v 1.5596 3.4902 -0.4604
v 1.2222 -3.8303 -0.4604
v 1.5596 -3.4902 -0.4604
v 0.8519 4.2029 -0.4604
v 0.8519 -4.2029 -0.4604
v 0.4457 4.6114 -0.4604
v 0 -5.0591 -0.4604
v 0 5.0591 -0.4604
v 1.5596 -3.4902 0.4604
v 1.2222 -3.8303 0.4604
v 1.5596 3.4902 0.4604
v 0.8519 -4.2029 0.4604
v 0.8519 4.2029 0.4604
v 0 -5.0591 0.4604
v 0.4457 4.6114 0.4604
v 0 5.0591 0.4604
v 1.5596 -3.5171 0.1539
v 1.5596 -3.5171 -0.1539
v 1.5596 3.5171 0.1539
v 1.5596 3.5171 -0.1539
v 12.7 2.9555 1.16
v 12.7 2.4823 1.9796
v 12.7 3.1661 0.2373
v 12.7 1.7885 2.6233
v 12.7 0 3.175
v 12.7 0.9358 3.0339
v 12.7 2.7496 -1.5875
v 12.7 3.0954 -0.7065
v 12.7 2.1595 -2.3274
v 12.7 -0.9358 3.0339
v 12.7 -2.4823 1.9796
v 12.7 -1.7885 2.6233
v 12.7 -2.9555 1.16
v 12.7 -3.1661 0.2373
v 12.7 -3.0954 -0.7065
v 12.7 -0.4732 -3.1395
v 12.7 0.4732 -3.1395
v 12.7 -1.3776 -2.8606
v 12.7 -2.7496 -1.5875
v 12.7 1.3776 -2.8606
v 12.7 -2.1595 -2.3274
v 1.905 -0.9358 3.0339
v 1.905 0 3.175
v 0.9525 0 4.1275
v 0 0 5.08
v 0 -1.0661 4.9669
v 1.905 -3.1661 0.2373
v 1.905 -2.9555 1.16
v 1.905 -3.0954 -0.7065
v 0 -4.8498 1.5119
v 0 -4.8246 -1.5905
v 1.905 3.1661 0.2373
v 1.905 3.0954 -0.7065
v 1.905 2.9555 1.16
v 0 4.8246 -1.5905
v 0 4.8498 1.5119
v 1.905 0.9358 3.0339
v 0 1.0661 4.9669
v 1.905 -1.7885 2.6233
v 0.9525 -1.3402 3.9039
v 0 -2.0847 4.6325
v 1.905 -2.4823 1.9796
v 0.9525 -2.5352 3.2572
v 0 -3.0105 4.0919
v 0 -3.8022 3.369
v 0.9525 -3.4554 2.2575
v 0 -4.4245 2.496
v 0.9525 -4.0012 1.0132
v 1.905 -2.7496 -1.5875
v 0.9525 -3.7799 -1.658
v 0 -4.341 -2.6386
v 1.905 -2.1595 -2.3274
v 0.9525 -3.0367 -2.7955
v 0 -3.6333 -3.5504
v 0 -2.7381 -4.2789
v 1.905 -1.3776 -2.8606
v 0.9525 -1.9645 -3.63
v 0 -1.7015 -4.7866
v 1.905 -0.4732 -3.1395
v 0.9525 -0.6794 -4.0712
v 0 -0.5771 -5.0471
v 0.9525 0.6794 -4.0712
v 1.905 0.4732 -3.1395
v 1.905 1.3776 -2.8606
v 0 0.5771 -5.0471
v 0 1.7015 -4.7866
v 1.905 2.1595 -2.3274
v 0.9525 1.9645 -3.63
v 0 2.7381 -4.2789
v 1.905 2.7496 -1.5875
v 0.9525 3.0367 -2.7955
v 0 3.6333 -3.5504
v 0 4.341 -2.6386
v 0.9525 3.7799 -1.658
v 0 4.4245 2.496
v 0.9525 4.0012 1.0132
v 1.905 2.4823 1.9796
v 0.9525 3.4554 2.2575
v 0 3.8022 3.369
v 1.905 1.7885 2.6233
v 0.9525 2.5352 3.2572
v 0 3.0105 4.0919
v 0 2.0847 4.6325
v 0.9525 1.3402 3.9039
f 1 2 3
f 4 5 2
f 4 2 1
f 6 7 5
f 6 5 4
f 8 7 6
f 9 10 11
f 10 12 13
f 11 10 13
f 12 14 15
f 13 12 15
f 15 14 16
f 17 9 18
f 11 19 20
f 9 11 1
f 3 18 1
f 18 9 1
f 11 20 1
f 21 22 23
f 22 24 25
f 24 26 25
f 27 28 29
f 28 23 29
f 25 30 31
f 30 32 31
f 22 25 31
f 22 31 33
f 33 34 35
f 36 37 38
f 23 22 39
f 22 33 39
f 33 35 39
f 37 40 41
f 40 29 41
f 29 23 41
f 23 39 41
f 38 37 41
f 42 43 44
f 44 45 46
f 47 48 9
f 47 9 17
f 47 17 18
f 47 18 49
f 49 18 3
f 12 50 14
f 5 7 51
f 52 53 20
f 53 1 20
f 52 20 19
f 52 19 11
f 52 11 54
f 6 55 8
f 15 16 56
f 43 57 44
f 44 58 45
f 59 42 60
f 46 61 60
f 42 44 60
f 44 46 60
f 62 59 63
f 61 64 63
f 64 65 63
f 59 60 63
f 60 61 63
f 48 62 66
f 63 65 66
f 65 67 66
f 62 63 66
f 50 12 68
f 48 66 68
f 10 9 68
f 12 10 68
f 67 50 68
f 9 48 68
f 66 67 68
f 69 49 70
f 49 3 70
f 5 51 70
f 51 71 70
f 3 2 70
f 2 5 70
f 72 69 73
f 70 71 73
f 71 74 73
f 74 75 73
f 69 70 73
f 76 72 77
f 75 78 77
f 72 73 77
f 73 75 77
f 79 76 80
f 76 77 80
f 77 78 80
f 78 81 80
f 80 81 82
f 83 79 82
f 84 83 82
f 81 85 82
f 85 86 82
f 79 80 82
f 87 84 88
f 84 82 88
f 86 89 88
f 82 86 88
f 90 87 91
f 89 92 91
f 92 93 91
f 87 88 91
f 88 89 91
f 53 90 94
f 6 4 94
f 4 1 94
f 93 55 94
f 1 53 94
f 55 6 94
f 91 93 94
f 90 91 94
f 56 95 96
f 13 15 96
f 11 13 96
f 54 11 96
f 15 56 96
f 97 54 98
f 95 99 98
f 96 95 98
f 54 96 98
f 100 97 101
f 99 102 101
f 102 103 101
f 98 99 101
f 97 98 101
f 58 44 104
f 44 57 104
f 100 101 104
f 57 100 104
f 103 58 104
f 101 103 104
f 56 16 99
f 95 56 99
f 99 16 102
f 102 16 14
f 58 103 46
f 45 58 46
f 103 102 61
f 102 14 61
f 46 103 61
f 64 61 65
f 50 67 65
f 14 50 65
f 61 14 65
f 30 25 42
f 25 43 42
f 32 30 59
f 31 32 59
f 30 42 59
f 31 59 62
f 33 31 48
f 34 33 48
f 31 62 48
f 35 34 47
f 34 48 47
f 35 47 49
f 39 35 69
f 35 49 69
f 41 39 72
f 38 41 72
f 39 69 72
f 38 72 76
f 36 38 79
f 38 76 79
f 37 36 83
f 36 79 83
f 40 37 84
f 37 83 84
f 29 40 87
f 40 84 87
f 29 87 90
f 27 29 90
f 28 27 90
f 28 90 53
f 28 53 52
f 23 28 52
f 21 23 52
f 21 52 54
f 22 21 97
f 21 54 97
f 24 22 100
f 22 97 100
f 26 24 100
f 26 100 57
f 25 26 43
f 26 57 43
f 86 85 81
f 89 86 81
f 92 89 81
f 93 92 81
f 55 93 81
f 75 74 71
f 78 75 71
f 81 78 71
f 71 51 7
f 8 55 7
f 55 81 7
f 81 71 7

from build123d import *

# Parameters (mm, degrees)
SKETCH2_W          = 3.119119432
SKETCH2_H          = 0.920816202
CUT_EXTRUDE1_DEPTH = 7.874


with BuildPart() as part:
    # Sketch1 → Revolve1 (revolve)
    with BuildSketch(Plane.XY, mode=Mode.PRIVATE) as revolve1_sk:
        Polygon((0, 0), (12.7, 0), (12.7, 3.175), (1.905, 3.175), (0, 5.08), align=None)
    revolve(revolve1_sk.sketch.rotate(Axis((0, 0, 0), (1, 0, 0)), 90), axis=Axis((0, 0, 0), (1, 0, 0)))

    # Sketch2 → Cut-Extrude1 (cut, symmetric)
    with BuildSketch(Plane(origin=(0, 0, 0), x_dir=(1, 0, 0), z_dir=(0, 1, 0))):
        Rectangle(SKETCH2_W, SKETCH2_H)
    extrude(amount=CUT_EXTRUDE1_DEPTH, both=True, mode=Mode.SUBTRACT)


solid = part.part
